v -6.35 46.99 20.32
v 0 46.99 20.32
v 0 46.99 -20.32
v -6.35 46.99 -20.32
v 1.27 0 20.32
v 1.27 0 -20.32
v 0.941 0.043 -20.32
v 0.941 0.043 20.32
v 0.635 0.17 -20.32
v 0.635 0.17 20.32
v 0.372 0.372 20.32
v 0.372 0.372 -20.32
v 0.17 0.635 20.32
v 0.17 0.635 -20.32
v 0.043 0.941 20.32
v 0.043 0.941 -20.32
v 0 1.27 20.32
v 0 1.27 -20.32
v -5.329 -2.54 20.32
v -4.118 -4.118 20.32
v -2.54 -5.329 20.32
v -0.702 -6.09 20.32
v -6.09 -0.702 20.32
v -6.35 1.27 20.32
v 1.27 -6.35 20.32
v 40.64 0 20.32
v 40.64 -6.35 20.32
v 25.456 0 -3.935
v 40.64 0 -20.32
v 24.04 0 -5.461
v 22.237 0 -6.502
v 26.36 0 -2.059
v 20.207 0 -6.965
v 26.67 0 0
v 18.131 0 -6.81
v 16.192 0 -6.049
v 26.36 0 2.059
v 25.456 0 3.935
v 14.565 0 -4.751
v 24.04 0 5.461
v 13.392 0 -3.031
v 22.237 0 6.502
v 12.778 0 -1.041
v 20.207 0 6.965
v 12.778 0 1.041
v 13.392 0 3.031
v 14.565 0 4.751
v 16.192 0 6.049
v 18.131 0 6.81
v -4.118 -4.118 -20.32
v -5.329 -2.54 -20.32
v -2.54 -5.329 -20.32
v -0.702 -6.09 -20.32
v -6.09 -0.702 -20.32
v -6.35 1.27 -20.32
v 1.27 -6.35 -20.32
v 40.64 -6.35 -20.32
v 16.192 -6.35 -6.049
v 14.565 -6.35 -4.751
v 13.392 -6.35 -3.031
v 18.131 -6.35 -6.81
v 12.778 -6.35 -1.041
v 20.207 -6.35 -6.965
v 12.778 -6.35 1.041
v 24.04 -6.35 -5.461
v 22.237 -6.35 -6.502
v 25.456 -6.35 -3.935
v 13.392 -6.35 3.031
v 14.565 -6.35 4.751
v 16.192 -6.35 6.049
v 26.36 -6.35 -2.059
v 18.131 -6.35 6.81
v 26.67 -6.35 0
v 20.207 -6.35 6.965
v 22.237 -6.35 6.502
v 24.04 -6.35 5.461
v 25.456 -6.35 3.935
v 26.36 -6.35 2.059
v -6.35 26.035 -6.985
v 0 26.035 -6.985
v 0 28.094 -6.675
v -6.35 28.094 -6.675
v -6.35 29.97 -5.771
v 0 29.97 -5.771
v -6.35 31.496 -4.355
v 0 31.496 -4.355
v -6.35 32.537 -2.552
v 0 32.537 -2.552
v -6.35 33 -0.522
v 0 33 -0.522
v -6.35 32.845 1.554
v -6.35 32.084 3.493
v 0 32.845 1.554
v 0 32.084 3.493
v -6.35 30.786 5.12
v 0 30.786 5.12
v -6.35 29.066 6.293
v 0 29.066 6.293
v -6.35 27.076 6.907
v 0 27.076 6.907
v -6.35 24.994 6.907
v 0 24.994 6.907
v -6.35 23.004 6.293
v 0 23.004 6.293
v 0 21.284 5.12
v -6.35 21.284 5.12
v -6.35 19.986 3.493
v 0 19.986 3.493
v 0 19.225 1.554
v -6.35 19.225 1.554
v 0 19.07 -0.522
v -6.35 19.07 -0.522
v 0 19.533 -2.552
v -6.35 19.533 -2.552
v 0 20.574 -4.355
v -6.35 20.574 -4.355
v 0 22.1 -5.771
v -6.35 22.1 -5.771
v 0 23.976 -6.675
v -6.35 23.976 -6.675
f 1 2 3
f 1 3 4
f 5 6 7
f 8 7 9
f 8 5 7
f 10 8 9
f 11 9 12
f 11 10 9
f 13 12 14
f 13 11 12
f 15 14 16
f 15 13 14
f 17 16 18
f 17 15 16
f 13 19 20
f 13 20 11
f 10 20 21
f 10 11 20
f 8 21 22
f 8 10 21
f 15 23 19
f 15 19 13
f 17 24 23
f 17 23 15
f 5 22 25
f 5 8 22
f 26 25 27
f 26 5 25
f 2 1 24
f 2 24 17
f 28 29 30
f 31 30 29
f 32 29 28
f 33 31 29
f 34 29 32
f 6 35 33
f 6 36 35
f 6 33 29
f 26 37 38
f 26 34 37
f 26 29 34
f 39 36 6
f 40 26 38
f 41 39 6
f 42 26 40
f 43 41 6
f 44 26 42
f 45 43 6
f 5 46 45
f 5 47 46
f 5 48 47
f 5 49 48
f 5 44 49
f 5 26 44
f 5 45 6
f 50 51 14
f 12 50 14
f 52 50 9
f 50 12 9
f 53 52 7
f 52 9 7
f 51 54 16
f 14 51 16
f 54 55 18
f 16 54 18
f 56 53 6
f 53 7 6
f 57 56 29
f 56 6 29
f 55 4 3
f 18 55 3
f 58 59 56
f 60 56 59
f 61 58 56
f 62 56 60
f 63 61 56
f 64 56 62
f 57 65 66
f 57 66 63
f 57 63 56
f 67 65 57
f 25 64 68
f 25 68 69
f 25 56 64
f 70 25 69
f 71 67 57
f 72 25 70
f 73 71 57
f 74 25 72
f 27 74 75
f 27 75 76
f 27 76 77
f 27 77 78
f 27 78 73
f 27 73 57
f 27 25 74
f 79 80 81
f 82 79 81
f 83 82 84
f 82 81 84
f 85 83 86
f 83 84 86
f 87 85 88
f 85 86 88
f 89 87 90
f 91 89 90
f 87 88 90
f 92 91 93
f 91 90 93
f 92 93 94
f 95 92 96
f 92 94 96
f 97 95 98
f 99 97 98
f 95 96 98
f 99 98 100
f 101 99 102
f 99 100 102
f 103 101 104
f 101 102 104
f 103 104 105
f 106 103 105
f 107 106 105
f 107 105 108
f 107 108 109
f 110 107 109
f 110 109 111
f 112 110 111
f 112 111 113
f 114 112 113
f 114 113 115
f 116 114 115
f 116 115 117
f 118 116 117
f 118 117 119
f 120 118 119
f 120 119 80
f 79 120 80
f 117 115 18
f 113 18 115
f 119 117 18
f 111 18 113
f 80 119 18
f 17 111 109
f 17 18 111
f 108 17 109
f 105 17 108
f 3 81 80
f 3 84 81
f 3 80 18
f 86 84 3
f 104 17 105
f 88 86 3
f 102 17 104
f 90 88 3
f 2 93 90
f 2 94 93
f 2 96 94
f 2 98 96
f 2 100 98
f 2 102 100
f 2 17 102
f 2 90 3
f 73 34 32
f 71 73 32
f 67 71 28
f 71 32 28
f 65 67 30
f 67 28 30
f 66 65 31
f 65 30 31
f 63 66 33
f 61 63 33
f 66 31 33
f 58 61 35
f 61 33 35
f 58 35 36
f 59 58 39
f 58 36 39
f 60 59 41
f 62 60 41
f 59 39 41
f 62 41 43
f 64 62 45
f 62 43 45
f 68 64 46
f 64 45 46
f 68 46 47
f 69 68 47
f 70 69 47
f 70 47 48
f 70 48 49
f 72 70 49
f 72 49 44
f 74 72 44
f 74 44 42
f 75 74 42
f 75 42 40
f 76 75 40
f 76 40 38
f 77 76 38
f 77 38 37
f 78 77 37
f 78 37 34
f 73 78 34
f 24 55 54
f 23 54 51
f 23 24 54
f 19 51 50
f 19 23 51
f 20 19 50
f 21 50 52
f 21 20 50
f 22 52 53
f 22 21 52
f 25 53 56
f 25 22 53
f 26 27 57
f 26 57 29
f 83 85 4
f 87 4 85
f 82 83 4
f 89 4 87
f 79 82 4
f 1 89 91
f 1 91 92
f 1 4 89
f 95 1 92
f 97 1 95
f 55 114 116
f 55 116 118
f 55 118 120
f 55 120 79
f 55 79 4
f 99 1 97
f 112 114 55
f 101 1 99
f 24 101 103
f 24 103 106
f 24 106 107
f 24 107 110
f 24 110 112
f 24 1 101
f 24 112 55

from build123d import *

# Parameters (mm, degrees)
BOSS_EXTRUDE1_DEPTH = 20.32
CUT_EXTRUDE1_REACH  = 8.35
SKETCH2_R           = 6.985
CUT_EXTRUDE2_REACH  = 8.35
SKETCH3_R           = 6.985


with BuildPart() as part:
    # Sketch1 → Boss-Extrude1 (new body, symmetric)
    with BuildSketch(Plane.XY):
        with BuildLine():
            Line((0, 1.27), (0, 46.99))
            Line((0, 46.99), (-6.35, 46.99))
            Line((-6.35, 46.99), (-6.35, 1.27))
            ThreePointArc((-6.35, 1.27), (-4.118153673, -4.118153673), (1.27, -6.35))
            Line((1.27, -6.35), (40.64, -6.35))
            Line((40.64, -6.35), (40.64, 0))
            Line((40.64, 0), (1.27, 0))
            ThreePointArc((1.27, 0), (0.371974388, 0.371974388), (0, 1.27))
        make_face()
    extrude(amount=BOSS_EXTRUDE1_DEPTH, both=True)

    # Sketch2 → Cut-Extrude1 (cut, up to next)
    with BuildSketch(Plane(origin=(0, 0, 0), x_dir=(0, 0, -1), z_dir=(1, 0, 0)), mode=Mode.PRIVATE) as cut_extrude1_sk1:
        with Locations((0, 26.035)):
            Circle(SKETCH2_R)
    cut_extrude1_tool1 = extrude(cut_extrude1_sk1.sketch, amount=-CUT_EXTRUDE1_REACH, mode=Mode.PRIVATE) & part.part
    add(cut_extrude1_tool1.solids().sort_by_distance((0, 26.035, 0))[0], mode=Mode.SUBTRACT)

    # Sketch3 → Cut-Extrude2 (cut, up to next)
    with BuildSketch(Plane(origin=(0, 0, 0), x_dir=(1, 0, 0), z_dir=(0, 1, 0)), mode=Mode.PRIVATE) as cut_extrude2_sk1:
        with Locations((19.685, 0)):
            Circle(SKETCH3_R)
    cut_extrude2_tool1 = extrude(cut_extrude2_sk1.sketch, amount=-CUT_EXTRUDE2_REACH, mode=Mode.PRIVATE) & part.part
    add(cut_extrude2_tool1.solids().sort_by_distance((19.685, 0, 0))[0], mode=Mode.SUBTRACT)


solid = part.part
